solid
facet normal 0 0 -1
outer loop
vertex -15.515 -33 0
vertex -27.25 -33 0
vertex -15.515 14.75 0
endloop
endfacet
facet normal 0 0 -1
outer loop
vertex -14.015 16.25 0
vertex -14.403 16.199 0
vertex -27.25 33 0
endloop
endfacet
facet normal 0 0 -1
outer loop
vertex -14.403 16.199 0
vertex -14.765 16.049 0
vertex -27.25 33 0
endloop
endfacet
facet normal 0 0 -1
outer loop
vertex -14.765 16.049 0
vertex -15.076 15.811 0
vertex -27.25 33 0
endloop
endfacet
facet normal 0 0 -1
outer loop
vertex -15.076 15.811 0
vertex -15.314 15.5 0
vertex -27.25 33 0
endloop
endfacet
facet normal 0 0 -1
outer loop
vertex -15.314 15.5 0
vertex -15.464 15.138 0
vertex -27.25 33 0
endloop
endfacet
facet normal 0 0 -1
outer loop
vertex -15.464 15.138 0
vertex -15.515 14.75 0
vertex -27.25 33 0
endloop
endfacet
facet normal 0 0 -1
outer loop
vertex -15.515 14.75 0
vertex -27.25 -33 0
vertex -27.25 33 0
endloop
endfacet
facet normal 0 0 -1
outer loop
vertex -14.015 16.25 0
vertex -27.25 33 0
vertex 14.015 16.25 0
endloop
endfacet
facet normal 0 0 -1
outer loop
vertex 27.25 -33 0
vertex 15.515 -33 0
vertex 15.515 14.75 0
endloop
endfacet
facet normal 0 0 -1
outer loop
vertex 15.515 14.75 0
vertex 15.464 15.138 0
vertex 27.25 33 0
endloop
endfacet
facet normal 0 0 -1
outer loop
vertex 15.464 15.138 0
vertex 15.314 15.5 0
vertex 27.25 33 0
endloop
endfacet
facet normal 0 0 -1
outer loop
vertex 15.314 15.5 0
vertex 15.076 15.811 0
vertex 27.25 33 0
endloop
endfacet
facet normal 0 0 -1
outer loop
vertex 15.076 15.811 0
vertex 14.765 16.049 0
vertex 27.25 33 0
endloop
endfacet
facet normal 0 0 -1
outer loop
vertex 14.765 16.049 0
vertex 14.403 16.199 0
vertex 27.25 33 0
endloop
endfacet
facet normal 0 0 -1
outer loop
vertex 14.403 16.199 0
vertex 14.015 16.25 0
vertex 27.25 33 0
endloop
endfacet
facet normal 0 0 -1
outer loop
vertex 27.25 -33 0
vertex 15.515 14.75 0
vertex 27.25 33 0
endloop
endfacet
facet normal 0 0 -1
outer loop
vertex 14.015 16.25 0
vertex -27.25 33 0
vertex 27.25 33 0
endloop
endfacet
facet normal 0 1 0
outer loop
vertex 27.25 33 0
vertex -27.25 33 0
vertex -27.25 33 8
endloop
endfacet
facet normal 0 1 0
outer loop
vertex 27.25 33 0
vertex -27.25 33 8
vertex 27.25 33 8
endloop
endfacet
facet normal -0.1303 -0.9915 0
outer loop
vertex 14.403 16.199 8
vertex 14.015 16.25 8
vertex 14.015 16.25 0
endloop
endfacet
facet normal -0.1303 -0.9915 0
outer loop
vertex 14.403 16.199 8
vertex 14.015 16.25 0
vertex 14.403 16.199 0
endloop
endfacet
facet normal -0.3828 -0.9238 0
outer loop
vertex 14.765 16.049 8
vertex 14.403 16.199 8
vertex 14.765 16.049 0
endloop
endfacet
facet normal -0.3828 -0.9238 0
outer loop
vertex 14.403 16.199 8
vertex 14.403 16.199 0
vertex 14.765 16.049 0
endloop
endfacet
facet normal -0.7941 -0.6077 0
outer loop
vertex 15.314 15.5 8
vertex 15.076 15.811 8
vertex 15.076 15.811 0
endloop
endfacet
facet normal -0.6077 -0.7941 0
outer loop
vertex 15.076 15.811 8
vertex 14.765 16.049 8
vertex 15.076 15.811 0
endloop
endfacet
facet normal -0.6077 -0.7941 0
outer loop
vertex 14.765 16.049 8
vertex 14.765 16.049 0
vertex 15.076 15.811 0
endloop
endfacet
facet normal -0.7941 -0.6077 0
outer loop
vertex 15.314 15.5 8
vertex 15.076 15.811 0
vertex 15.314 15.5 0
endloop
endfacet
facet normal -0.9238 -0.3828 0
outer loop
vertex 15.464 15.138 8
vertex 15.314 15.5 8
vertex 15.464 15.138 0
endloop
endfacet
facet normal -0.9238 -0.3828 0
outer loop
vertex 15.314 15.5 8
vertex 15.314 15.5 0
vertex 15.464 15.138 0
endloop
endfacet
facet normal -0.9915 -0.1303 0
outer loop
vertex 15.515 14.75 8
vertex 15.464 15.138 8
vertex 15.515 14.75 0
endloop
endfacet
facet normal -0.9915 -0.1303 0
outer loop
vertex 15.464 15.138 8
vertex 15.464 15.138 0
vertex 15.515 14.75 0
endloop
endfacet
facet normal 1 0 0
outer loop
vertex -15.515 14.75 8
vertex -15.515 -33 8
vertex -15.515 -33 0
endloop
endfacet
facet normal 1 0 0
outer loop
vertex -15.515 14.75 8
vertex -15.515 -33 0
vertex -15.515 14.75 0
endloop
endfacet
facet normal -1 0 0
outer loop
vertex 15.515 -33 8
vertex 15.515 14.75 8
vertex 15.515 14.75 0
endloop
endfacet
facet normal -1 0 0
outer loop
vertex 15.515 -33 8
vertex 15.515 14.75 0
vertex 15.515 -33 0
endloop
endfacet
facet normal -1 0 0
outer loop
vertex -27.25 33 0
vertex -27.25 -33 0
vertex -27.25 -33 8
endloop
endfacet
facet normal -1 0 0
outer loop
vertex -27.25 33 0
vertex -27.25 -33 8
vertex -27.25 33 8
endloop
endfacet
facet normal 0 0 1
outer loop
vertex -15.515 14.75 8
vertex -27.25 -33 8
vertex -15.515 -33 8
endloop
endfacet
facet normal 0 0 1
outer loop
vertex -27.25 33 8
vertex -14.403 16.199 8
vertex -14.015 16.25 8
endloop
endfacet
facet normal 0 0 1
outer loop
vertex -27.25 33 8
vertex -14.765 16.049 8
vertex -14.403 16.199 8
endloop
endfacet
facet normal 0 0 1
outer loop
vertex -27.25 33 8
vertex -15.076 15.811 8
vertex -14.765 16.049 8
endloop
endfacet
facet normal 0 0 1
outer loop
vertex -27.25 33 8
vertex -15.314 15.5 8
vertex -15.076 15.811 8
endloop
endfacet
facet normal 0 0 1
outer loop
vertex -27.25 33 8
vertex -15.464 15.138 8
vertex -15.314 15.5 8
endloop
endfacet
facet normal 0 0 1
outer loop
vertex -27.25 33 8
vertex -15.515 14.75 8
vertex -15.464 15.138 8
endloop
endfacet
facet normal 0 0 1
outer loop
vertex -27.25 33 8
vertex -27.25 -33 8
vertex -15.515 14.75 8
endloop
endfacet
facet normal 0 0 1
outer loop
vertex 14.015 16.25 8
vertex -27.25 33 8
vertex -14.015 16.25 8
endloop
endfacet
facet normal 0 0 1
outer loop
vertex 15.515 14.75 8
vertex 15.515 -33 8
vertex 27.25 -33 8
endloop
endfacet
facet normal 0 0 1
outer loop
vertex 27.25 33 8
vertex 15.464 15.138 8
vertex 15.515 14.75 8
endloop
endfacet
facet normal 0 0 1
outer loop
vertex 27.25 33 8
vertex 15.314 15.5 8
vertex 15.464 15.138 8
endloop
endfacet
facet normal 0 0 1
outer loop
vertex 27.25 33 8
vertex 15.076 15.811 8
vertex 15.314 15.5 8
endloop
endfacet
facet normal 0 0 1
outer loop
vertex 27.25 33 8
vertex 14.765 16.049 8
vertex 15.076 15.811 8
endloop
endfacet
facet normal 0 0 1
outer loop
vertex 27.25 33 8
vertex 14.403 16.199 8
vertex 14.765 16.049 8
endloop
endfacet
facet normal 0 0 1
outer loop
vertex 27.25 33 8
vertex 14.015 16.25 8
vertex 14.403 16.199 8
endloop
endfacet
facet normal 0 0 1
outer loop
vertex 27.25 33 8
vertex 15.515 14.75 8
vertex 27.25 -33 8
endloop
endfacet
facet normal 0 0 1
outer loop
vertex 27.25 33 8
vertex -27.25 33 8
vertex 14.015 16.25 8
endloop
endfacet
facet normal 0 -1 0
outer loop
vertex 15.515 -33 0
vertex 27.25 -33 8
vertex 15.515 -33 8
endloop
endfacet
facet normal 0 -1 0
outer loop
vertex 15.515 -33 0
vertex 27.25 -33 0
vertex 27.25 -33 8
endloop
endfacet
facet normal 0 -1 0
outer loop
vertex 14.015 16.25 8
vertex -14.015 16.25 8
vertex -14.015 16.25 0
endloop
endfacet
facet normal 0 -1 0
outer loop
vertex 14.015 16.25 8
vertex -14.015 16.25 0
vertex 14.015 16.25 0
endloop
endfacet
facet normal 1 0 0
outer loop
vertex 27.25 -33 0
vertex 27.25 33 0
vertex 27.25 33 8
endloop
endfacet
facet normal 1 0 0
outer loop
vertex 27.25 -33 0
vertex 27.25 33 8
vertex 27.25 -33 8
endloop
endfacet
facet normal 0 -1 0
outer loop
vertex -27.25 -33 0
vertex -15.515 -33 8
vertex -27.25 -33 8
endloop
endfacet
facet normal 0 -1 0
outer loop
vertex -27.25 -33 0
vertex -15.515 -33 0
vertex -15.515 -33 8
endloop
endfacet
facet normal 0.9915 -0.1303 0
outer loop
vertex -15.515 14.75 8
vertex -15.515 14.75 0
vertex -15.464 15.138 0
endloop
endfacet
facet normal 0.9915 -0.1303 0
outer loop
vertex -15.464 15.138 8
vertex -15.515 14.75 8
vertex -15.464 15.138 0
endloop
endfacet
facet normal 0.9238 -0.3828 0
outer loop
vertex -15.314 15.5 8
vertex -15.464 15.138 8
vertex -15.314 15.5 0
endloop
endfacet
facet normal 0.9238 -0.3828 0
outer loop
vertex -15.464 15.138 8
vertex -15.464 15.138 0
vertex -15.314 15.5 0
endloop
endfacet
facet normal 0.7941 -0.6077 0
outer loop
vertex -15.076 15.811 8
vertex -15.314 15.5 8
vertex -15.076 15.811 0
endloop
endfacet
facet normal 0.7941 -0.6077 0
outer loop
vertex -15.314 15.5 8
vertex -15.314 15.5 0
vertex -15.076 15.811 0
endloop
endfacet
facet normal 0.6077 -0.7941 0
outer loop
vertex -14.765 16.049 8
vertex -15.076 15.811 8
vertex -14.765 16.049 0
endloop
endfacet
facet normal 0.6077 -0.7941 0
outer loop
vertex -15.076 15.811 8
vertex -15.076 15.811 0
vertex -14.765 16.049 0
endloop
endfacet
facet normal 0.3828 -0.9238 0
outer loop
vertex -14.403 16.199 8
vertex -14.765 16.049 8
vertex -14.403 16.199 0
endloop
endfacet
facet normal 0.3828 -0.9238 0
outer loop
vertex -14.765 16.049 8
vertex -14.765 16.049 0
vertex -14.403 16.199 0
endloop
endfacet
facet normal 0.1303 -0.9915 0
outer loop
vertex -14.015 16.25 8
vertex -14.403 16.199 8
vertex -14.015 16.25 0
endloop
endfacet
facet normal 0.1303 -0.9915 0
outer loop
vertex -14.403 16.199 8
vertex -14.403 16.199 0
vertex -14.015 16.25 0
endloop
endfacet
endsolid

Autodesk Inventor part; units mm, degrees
ref_plane "YZ Plane" through (0, 0, 0) normal (1, 0, 0) x (0, 1, 0)
ref_plane "XZ Plane" through (0, 0, 0) normal (0, 1, 0) x (-1, 0, 0)
ref_plane "XY Plane" through (0, 0, 0) normal (0, 0, 1) x (1, 0, 0)
sketch "Sketch1" plane through (0, 0, 0) normal (0, 0, 1) x (1, 0, 0)
  line L0 (-27.25, 33) -> (27.25, 33)
  line L1 (27.25, 33) -> (27.25, -33)
  line L2 (27.25, -33) -> (-27.25, -33)
  line L3 (-27.25, -33) -> (-27.25, 33)
  point P0 (0, 0)
  point P1 (0, 33)
  point P2 (-27.25, 0)
  dimension "d0" = 54.5
  dimension "d1" = 66
extrude "Extrusion1" add sketch "Sketch1" along normal blind 8
sketch "Sketch2" plane through (0, 0, 8) normal (0, 0, 1) x (1, 0, 0)
  line L0 (27.25, 33) -> (-27.25, 33) projected
  line L1 (-27.25, 33) -> (-27.25, -33) projected
  line L2 (-7.6866, 14.25) -> (7.6866, 14.25) projected
  line L3 (-12.41, -5.57) -> (-12.41, -14.27) projected
  line L4 (-13.515, -31) -> (-13.515, 8.4216) projected
  line L5 (13.515, 8.4216) -> (13.515, -31) projected
  line L6 (-27.25, -33) -> (27.25, -33) projected
  line L7 (-15.515, 16.25) -> (15.515, 16.25)
  line L8 (15.515, 16.25) -> (15.515, -33)
  line L9 (15.515, -33) -> (-15.515, -33)
  line L10 (-15.515, -33) -> (-15.515, 16.25)
  line L11 (-27.25, -33) -> (27.25, -33) projected
  point P0 (-27.25, 0)
  dimension "d29" = 2
  dimension "d30" = 2
  dimension "d32" = 2
extrude "Extrusion2" cut sketch "Sketch2" against normal through all
fillet "Fillet1" radius 1.5 2 edges at (-15.515, 16.25, 4) (15.515, 16.25, 4)
equation "\"d32\" = d30"
properties part number "0005-10-026 Suport DC in" material "Wood (Cherry)"
